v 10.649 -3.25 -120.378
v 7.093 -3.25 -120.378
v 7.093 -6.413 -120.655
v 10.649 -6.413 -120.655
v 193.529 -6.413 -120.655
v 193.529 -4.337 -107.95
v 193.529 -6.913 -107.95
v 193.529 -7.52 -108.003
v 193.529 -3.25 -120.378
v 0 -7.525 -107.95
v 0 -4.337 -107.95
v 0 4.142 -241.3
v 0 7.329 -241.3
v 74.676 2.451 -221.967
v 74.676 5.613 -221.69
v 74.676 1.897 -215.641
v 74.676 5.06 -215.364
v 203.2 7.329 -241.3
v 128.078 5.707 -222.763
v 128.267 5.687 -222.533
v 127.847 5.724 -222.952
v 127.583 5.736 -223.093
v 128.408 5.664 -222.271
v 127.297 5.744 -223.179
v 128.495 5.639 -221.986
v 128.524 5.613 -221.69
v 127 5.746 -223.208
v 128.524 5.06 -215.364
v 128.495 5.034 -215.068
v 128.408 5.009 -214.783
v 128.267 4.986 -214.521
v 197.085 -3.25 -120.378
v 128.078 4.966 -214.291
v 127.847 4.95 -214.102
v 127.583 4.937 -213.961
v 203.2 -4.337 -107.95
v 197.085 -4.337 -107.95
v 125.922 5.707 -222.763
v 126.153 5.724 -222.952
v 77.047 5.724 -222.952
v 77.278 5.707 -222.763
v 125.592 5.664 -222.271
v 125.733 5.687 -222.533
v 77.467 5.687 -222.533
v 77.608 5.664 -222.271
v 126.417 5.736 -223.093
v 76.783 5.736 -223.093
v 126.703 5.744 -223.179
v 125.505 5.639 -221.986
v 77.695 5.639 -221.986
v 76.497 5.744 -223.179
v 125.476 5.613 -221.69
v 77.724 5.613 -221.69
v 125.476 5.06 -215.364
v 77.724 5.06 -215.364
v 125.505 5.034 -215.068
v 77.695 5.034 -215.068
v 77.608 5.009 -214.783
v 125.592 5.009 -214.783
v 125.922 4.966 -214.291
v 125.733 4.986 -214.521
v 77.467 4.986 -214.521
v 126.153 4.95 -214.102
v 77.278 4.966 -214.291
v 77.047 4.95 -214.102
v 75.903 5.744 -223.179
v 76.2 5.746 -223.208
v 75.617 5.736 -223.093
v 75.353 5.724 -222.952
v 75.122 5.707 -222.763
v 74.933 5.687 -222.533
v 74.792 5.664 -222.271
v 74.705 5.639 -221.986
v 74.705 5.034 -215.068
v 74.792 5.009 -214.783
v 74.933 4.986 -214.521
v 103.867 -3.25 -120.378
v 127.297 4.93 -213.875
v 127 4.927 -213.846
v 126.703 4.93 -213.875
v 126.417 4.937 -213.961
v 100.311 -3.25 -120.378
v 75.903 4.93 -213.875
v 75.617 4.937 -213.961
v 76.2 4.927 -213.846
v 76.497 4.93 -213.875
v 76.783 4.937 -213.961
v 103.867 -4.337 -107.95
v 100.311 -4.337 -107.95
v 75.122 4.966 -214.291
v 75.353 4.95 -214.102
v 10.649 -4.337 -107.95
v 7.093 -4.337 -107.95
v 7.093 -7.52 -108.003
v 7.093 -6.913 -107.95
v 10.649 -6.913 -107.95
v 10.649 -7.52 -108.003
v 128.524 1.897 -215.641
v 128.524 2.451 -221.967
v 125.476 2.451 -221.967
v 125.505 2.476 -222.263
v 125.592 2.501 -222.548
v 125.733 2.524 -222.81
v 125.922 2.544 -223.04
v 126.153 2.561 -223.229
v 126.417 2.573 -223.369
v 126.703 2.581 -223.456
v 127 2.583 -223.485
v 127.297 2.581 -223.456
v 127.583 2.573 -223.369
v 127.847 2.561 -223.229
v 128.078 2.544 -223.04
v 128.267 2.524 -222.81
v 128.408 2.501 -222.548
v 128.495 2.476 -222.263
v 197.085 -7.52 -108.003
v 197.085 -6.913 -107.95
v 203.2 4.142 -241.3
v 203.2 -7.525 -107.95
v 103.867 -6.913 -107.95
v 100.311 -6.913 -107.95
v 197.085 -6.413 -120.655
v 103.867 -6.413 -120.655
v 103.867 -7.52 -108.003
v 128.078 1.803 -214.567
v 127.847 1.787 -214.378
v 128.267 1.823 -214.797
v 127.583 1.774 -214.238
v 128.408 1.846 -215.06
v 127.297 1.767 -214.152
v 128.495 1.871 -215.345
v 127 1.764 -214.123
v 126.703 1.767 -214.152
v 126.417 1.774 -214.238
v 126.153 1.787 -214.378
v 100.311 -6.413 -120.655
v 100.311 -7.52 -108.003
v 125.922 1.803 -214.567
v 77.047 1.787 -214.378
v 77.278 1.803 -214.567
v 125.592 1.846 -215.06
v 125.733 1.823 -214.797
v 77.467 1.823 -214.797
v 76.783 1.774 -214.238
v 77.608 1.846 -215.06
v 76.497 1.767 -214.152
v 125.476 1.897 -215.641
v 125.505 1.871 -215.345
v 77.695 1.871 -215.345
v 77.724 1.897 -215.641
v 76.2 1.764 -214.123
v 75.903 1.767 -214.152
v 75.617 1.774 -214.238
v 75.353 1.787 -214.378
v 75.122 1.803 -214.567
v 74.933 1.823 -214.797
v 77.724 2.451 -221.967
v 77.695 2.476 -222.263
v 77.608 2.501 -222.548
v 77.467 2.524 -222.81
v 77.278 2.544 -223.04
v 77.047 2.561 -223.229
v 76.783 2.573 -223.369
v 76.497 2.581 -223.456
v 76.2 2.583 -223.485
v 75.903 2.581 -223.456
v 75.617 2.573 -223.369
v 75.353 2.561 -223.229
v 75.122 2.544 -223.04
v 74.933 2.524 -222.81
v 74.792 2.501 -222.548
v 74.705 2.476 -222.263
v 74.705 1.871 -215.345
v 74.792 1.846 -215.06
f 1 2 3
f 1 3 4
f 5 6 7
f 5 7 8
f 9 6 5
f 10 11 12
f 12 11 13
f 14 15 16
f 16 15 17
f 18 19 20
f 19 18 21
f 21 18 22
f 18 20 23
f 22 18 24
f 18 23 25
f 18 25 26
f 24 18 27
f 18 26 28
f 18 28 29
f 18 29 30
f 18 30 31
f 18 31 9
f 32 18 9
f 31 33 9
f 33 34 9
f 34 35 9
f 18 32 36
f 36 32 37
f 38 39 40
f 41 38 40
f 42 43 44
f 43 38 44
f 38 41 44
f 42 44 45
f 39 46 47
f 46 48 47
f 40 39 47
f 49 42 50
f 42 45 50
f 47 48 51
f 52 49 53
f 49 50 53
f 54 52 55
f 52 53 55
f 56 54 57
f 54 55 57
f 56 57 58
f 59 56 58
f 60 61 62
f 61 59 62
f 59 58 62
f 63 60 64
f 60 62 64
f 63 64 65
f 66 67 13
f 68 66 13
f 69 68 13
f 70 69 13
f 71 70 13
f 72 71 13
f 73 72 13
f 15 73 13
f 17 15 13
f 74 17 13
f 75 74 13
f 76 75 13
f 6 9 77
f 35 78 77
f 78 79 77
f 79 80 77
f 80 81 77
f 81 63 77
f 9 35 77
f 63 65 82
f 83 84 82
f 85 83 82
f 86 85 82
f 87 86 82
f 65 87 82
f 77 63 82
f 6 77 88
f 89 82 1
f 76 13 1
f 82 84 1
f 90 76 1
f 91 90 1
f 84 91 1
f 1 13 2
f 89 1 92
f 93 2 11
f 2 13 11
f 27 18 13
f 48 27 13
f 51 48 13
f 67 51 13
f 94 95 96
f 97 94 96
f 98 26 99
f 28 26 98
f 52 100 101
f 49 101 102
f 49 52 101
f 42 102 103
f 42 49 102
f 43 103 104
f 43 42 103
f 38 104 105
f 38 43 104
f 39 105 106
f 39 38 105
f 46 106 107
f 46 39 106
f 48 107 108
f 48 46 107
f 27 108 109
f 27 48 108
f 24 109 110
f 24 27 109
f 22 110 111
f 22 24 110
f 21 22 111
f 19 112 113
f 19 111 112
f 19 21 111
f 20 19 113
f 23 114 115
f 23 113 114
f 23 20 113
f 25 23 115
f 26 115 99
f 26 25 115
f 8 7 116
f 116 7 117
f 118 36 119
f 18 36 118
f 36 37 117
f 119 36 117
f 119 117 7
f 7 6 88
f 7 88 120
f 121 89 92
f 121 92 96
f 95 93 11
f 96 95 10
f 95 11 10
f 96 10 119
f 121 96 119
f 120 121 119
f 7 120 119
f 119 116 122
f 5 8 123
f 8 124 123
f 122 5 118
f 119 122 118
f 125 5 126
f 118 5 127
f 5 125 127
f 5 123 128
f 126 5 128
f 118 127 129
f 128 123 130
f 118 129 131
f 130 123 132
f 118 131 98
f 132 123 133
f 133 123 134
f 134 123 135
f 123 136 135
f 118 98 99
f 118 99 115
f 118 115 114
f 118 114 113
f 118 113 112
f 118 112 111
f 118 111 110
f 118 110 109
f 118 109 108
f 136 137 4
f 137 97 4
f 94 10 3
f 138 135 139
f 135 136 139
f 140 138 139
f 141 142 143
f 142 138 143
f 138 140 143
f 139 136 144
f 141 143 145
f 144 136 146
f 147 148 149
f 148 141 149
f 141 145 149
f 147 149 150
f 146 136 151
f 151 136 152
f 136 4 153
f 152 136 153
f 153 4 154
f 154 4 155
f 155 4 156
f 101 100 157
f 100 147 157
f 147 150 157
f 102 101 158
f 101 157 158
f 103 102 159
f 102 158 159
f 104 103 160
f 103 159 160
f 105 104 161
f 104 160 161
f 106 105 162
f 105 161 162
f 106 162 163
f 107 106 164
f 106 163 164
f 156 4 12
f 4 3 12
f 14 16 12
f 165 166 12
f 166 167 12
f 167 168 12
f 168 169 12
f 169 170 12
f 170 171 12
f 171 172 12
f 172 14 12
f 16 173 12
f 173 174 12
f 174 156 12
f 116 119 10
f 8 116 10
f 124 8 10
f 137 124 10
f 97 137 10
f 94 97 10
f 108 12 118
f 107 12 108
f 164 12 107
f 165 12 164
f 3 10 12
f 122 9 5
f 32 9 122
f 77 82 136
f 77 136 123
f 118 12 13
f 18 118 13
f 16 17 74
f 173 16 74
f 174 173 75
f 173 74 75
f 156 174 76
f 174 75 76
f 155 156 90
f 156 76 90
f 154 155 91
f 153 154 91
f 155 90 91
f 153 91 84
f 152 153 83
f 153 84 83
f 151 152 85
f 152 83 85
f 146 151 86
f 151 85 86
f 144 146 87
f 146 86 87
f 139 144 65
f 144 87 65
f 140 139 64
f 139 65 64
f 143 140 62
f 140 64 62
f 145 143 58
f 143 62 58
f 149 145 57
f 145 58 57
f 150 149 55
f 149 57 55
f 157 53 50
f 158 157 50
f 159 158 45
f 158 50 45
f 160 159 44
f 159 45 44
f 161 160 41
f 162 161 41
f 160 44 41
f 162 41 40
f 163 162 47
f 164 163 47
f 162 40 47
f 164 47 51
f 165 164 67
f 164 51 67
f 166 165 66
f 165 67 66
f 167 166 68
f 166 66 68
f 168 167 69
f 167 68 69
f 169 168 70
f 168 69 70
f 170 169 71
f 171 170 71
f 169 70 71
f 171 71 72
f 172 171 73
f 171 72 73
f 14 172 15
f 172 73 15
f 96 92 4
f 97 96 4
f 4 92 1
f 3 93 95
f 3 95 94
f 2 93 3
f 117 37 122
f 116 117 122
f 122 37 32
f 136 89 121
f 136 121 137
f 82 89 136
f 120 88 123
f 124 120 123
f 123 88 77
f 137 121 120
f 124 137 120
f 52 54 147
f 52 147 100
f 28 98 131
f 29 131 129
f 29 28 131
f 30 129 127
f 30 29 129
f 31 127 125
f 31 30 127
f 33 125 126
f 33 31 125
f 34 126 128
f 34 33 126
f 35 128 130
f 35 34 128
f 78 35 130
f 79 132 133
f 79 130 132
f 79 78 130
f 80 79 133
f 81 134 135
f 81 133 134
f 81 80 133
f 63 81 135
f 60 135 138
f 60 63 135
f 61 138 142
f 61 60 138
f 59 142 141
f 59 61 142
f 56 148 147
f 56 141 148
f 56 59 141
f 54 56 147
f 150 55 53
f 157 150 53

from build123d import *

# Parameters (mm, degrees)
BOSS_EXTRUDE1_DEPTH = 203.2
CUT_EXTRUDE1_DEPTH  = 316.247758015
CUT_EXTRUDE2_REACH  = 317.248
SKETCH3_W           = 3.556
SKETCH3_H           = 12.7


with BuildPart() as part:
    # Sketch1 → Boss-Extrude1 (new body)
    with BuildSketch(Plane(origin=(0, 0, 0), x_dir=(0, 0, -1), z_dir=(1, 0, 0))):
        Polygon((107.95, -4.33747573), (107.95, -7.524603714), (241.3, 4.142009567), (241.3, 7.329137551), align=None)
    extrude(amount=BOSS_EXTRUDE1_DEPTH)

    # Sketch2 → Cut-Extrude1 (cut, through all)
    with BuildSketch(Plane(origin=(0, -13.677188118, -1.196598909), x_dir=(1, 0, 0), z_dir=(0, 0.9961946980917459, 0.08715574274765497))):
        with BuildLine():
            Line((74.676, 221.335557077), (74.676, 214.985557077))
            ThreePointArc((74.676, 214.985557077), (76.2, 213.461557077), (77.724, 214.985557077))
            Line((77.724, 214.985557077), (77.724, 221.335557077))
            ThreePointArc((77.724, 221.335557077), (76.2, 222.859557077), (74.676, 221.335557077))
        make_face()
        with BuildLine():
            Line((128.524, 221.335557077), (128.524, 214.985557077))
            ThreePointArc((128.524, 214.985557077), (127, 213.461557077), (125.476, 214.985557077))
            Line((125.476, 214.985557077), (125.476, 221.335557077))
            ThreePointArc((125.476, 221.335557077), (127, 222.859557077), (128.524, 221.335557077))
        make_face()
    extrude(amount=-CUT_EXTRUDE1_DEPTH, mode=Mode.SUBTRACT)

    # Sketch3 → Cut-Extrude2 (cut, up to next)
    with BuildSketch(Plane(origin=(0, -13.677188118, -1.196598909), x_dir=(1, 0, 0), z_dir=(0, 0.9961946980917459, 0.08715574274765481)), mode=Mode.PRIVATE) as cut_extrude2_sk1:
        with Locations((8.870592235, 113.286692619)):
            Rectangle(SKETCH3_W, SKETCH3_H)
    cut_extrude2_tool1 = extrude(cut_extrude2_sk1.sketch, amount=-CUT_EXTRUDE2_REACH, mode=Mode.PRIVATE) & part.part
    # Sketch3 → Cut-Extrude2 (cut, up to next)
    with BuildSketch(Plane(origin=(0, -13.677188118, -1.196598909), x_dir=(1, 0, 0), z_dir=(0, 0.9961946980917459, 0.08715574274765481)), mode=Mode.PRIVATE) as cut_extrude2_sk2:
        with Locations((102.088592235, 113.286692619)):
            Rectangle(SKETCH3_W, SKETCH3_H)
    cut_extrude2_tool2 = extrude(cut_extrude2_sk2.sketch, amount=-CUT_EXTRUDE2_REACH, mode=Mode.PRIVATE) & part.part
    # Sketch3 → Cut-Extrude2 (cut, up to next)
    with BuildSketch(Plane(origin=(0, -13.677188118, -1.196598909), x_dir=(1, 0, 0), z_dir=(0, 0.9961946980917459, 0.08715574274765481)), mode=Mode.PRIVATE) as cut_extrude2_sk3:
        with Locations((195.306592235, 113.286692619)):
            Rectangle(SKETCH3_W, SKETCH3_H)
    cut_extrude2_tool3 = extrude(cut_extrude2_sk3.sketch, amount=-CUT_EXTRUDE2_REACH, mode=Mode.PRIVATE) & part.part
    add(cut_extrude2_tool1.solids().sort_by_distance((8.870592, -3.803602, -114.052201))[0], mode=Mode.SUBTRACT)
    add(cut_extrude2_tool2.solids().sort_by_distance((102.088592, -3.803602, -114.052201))[0], mode=Mode.SUBTRACT)
    add(cut_extrude2_tool3.solids().sort_by_distance((195.306592, -3.803602, -114.052201))[0], mode=Mode.SUBTRACT)


solid = part.part
